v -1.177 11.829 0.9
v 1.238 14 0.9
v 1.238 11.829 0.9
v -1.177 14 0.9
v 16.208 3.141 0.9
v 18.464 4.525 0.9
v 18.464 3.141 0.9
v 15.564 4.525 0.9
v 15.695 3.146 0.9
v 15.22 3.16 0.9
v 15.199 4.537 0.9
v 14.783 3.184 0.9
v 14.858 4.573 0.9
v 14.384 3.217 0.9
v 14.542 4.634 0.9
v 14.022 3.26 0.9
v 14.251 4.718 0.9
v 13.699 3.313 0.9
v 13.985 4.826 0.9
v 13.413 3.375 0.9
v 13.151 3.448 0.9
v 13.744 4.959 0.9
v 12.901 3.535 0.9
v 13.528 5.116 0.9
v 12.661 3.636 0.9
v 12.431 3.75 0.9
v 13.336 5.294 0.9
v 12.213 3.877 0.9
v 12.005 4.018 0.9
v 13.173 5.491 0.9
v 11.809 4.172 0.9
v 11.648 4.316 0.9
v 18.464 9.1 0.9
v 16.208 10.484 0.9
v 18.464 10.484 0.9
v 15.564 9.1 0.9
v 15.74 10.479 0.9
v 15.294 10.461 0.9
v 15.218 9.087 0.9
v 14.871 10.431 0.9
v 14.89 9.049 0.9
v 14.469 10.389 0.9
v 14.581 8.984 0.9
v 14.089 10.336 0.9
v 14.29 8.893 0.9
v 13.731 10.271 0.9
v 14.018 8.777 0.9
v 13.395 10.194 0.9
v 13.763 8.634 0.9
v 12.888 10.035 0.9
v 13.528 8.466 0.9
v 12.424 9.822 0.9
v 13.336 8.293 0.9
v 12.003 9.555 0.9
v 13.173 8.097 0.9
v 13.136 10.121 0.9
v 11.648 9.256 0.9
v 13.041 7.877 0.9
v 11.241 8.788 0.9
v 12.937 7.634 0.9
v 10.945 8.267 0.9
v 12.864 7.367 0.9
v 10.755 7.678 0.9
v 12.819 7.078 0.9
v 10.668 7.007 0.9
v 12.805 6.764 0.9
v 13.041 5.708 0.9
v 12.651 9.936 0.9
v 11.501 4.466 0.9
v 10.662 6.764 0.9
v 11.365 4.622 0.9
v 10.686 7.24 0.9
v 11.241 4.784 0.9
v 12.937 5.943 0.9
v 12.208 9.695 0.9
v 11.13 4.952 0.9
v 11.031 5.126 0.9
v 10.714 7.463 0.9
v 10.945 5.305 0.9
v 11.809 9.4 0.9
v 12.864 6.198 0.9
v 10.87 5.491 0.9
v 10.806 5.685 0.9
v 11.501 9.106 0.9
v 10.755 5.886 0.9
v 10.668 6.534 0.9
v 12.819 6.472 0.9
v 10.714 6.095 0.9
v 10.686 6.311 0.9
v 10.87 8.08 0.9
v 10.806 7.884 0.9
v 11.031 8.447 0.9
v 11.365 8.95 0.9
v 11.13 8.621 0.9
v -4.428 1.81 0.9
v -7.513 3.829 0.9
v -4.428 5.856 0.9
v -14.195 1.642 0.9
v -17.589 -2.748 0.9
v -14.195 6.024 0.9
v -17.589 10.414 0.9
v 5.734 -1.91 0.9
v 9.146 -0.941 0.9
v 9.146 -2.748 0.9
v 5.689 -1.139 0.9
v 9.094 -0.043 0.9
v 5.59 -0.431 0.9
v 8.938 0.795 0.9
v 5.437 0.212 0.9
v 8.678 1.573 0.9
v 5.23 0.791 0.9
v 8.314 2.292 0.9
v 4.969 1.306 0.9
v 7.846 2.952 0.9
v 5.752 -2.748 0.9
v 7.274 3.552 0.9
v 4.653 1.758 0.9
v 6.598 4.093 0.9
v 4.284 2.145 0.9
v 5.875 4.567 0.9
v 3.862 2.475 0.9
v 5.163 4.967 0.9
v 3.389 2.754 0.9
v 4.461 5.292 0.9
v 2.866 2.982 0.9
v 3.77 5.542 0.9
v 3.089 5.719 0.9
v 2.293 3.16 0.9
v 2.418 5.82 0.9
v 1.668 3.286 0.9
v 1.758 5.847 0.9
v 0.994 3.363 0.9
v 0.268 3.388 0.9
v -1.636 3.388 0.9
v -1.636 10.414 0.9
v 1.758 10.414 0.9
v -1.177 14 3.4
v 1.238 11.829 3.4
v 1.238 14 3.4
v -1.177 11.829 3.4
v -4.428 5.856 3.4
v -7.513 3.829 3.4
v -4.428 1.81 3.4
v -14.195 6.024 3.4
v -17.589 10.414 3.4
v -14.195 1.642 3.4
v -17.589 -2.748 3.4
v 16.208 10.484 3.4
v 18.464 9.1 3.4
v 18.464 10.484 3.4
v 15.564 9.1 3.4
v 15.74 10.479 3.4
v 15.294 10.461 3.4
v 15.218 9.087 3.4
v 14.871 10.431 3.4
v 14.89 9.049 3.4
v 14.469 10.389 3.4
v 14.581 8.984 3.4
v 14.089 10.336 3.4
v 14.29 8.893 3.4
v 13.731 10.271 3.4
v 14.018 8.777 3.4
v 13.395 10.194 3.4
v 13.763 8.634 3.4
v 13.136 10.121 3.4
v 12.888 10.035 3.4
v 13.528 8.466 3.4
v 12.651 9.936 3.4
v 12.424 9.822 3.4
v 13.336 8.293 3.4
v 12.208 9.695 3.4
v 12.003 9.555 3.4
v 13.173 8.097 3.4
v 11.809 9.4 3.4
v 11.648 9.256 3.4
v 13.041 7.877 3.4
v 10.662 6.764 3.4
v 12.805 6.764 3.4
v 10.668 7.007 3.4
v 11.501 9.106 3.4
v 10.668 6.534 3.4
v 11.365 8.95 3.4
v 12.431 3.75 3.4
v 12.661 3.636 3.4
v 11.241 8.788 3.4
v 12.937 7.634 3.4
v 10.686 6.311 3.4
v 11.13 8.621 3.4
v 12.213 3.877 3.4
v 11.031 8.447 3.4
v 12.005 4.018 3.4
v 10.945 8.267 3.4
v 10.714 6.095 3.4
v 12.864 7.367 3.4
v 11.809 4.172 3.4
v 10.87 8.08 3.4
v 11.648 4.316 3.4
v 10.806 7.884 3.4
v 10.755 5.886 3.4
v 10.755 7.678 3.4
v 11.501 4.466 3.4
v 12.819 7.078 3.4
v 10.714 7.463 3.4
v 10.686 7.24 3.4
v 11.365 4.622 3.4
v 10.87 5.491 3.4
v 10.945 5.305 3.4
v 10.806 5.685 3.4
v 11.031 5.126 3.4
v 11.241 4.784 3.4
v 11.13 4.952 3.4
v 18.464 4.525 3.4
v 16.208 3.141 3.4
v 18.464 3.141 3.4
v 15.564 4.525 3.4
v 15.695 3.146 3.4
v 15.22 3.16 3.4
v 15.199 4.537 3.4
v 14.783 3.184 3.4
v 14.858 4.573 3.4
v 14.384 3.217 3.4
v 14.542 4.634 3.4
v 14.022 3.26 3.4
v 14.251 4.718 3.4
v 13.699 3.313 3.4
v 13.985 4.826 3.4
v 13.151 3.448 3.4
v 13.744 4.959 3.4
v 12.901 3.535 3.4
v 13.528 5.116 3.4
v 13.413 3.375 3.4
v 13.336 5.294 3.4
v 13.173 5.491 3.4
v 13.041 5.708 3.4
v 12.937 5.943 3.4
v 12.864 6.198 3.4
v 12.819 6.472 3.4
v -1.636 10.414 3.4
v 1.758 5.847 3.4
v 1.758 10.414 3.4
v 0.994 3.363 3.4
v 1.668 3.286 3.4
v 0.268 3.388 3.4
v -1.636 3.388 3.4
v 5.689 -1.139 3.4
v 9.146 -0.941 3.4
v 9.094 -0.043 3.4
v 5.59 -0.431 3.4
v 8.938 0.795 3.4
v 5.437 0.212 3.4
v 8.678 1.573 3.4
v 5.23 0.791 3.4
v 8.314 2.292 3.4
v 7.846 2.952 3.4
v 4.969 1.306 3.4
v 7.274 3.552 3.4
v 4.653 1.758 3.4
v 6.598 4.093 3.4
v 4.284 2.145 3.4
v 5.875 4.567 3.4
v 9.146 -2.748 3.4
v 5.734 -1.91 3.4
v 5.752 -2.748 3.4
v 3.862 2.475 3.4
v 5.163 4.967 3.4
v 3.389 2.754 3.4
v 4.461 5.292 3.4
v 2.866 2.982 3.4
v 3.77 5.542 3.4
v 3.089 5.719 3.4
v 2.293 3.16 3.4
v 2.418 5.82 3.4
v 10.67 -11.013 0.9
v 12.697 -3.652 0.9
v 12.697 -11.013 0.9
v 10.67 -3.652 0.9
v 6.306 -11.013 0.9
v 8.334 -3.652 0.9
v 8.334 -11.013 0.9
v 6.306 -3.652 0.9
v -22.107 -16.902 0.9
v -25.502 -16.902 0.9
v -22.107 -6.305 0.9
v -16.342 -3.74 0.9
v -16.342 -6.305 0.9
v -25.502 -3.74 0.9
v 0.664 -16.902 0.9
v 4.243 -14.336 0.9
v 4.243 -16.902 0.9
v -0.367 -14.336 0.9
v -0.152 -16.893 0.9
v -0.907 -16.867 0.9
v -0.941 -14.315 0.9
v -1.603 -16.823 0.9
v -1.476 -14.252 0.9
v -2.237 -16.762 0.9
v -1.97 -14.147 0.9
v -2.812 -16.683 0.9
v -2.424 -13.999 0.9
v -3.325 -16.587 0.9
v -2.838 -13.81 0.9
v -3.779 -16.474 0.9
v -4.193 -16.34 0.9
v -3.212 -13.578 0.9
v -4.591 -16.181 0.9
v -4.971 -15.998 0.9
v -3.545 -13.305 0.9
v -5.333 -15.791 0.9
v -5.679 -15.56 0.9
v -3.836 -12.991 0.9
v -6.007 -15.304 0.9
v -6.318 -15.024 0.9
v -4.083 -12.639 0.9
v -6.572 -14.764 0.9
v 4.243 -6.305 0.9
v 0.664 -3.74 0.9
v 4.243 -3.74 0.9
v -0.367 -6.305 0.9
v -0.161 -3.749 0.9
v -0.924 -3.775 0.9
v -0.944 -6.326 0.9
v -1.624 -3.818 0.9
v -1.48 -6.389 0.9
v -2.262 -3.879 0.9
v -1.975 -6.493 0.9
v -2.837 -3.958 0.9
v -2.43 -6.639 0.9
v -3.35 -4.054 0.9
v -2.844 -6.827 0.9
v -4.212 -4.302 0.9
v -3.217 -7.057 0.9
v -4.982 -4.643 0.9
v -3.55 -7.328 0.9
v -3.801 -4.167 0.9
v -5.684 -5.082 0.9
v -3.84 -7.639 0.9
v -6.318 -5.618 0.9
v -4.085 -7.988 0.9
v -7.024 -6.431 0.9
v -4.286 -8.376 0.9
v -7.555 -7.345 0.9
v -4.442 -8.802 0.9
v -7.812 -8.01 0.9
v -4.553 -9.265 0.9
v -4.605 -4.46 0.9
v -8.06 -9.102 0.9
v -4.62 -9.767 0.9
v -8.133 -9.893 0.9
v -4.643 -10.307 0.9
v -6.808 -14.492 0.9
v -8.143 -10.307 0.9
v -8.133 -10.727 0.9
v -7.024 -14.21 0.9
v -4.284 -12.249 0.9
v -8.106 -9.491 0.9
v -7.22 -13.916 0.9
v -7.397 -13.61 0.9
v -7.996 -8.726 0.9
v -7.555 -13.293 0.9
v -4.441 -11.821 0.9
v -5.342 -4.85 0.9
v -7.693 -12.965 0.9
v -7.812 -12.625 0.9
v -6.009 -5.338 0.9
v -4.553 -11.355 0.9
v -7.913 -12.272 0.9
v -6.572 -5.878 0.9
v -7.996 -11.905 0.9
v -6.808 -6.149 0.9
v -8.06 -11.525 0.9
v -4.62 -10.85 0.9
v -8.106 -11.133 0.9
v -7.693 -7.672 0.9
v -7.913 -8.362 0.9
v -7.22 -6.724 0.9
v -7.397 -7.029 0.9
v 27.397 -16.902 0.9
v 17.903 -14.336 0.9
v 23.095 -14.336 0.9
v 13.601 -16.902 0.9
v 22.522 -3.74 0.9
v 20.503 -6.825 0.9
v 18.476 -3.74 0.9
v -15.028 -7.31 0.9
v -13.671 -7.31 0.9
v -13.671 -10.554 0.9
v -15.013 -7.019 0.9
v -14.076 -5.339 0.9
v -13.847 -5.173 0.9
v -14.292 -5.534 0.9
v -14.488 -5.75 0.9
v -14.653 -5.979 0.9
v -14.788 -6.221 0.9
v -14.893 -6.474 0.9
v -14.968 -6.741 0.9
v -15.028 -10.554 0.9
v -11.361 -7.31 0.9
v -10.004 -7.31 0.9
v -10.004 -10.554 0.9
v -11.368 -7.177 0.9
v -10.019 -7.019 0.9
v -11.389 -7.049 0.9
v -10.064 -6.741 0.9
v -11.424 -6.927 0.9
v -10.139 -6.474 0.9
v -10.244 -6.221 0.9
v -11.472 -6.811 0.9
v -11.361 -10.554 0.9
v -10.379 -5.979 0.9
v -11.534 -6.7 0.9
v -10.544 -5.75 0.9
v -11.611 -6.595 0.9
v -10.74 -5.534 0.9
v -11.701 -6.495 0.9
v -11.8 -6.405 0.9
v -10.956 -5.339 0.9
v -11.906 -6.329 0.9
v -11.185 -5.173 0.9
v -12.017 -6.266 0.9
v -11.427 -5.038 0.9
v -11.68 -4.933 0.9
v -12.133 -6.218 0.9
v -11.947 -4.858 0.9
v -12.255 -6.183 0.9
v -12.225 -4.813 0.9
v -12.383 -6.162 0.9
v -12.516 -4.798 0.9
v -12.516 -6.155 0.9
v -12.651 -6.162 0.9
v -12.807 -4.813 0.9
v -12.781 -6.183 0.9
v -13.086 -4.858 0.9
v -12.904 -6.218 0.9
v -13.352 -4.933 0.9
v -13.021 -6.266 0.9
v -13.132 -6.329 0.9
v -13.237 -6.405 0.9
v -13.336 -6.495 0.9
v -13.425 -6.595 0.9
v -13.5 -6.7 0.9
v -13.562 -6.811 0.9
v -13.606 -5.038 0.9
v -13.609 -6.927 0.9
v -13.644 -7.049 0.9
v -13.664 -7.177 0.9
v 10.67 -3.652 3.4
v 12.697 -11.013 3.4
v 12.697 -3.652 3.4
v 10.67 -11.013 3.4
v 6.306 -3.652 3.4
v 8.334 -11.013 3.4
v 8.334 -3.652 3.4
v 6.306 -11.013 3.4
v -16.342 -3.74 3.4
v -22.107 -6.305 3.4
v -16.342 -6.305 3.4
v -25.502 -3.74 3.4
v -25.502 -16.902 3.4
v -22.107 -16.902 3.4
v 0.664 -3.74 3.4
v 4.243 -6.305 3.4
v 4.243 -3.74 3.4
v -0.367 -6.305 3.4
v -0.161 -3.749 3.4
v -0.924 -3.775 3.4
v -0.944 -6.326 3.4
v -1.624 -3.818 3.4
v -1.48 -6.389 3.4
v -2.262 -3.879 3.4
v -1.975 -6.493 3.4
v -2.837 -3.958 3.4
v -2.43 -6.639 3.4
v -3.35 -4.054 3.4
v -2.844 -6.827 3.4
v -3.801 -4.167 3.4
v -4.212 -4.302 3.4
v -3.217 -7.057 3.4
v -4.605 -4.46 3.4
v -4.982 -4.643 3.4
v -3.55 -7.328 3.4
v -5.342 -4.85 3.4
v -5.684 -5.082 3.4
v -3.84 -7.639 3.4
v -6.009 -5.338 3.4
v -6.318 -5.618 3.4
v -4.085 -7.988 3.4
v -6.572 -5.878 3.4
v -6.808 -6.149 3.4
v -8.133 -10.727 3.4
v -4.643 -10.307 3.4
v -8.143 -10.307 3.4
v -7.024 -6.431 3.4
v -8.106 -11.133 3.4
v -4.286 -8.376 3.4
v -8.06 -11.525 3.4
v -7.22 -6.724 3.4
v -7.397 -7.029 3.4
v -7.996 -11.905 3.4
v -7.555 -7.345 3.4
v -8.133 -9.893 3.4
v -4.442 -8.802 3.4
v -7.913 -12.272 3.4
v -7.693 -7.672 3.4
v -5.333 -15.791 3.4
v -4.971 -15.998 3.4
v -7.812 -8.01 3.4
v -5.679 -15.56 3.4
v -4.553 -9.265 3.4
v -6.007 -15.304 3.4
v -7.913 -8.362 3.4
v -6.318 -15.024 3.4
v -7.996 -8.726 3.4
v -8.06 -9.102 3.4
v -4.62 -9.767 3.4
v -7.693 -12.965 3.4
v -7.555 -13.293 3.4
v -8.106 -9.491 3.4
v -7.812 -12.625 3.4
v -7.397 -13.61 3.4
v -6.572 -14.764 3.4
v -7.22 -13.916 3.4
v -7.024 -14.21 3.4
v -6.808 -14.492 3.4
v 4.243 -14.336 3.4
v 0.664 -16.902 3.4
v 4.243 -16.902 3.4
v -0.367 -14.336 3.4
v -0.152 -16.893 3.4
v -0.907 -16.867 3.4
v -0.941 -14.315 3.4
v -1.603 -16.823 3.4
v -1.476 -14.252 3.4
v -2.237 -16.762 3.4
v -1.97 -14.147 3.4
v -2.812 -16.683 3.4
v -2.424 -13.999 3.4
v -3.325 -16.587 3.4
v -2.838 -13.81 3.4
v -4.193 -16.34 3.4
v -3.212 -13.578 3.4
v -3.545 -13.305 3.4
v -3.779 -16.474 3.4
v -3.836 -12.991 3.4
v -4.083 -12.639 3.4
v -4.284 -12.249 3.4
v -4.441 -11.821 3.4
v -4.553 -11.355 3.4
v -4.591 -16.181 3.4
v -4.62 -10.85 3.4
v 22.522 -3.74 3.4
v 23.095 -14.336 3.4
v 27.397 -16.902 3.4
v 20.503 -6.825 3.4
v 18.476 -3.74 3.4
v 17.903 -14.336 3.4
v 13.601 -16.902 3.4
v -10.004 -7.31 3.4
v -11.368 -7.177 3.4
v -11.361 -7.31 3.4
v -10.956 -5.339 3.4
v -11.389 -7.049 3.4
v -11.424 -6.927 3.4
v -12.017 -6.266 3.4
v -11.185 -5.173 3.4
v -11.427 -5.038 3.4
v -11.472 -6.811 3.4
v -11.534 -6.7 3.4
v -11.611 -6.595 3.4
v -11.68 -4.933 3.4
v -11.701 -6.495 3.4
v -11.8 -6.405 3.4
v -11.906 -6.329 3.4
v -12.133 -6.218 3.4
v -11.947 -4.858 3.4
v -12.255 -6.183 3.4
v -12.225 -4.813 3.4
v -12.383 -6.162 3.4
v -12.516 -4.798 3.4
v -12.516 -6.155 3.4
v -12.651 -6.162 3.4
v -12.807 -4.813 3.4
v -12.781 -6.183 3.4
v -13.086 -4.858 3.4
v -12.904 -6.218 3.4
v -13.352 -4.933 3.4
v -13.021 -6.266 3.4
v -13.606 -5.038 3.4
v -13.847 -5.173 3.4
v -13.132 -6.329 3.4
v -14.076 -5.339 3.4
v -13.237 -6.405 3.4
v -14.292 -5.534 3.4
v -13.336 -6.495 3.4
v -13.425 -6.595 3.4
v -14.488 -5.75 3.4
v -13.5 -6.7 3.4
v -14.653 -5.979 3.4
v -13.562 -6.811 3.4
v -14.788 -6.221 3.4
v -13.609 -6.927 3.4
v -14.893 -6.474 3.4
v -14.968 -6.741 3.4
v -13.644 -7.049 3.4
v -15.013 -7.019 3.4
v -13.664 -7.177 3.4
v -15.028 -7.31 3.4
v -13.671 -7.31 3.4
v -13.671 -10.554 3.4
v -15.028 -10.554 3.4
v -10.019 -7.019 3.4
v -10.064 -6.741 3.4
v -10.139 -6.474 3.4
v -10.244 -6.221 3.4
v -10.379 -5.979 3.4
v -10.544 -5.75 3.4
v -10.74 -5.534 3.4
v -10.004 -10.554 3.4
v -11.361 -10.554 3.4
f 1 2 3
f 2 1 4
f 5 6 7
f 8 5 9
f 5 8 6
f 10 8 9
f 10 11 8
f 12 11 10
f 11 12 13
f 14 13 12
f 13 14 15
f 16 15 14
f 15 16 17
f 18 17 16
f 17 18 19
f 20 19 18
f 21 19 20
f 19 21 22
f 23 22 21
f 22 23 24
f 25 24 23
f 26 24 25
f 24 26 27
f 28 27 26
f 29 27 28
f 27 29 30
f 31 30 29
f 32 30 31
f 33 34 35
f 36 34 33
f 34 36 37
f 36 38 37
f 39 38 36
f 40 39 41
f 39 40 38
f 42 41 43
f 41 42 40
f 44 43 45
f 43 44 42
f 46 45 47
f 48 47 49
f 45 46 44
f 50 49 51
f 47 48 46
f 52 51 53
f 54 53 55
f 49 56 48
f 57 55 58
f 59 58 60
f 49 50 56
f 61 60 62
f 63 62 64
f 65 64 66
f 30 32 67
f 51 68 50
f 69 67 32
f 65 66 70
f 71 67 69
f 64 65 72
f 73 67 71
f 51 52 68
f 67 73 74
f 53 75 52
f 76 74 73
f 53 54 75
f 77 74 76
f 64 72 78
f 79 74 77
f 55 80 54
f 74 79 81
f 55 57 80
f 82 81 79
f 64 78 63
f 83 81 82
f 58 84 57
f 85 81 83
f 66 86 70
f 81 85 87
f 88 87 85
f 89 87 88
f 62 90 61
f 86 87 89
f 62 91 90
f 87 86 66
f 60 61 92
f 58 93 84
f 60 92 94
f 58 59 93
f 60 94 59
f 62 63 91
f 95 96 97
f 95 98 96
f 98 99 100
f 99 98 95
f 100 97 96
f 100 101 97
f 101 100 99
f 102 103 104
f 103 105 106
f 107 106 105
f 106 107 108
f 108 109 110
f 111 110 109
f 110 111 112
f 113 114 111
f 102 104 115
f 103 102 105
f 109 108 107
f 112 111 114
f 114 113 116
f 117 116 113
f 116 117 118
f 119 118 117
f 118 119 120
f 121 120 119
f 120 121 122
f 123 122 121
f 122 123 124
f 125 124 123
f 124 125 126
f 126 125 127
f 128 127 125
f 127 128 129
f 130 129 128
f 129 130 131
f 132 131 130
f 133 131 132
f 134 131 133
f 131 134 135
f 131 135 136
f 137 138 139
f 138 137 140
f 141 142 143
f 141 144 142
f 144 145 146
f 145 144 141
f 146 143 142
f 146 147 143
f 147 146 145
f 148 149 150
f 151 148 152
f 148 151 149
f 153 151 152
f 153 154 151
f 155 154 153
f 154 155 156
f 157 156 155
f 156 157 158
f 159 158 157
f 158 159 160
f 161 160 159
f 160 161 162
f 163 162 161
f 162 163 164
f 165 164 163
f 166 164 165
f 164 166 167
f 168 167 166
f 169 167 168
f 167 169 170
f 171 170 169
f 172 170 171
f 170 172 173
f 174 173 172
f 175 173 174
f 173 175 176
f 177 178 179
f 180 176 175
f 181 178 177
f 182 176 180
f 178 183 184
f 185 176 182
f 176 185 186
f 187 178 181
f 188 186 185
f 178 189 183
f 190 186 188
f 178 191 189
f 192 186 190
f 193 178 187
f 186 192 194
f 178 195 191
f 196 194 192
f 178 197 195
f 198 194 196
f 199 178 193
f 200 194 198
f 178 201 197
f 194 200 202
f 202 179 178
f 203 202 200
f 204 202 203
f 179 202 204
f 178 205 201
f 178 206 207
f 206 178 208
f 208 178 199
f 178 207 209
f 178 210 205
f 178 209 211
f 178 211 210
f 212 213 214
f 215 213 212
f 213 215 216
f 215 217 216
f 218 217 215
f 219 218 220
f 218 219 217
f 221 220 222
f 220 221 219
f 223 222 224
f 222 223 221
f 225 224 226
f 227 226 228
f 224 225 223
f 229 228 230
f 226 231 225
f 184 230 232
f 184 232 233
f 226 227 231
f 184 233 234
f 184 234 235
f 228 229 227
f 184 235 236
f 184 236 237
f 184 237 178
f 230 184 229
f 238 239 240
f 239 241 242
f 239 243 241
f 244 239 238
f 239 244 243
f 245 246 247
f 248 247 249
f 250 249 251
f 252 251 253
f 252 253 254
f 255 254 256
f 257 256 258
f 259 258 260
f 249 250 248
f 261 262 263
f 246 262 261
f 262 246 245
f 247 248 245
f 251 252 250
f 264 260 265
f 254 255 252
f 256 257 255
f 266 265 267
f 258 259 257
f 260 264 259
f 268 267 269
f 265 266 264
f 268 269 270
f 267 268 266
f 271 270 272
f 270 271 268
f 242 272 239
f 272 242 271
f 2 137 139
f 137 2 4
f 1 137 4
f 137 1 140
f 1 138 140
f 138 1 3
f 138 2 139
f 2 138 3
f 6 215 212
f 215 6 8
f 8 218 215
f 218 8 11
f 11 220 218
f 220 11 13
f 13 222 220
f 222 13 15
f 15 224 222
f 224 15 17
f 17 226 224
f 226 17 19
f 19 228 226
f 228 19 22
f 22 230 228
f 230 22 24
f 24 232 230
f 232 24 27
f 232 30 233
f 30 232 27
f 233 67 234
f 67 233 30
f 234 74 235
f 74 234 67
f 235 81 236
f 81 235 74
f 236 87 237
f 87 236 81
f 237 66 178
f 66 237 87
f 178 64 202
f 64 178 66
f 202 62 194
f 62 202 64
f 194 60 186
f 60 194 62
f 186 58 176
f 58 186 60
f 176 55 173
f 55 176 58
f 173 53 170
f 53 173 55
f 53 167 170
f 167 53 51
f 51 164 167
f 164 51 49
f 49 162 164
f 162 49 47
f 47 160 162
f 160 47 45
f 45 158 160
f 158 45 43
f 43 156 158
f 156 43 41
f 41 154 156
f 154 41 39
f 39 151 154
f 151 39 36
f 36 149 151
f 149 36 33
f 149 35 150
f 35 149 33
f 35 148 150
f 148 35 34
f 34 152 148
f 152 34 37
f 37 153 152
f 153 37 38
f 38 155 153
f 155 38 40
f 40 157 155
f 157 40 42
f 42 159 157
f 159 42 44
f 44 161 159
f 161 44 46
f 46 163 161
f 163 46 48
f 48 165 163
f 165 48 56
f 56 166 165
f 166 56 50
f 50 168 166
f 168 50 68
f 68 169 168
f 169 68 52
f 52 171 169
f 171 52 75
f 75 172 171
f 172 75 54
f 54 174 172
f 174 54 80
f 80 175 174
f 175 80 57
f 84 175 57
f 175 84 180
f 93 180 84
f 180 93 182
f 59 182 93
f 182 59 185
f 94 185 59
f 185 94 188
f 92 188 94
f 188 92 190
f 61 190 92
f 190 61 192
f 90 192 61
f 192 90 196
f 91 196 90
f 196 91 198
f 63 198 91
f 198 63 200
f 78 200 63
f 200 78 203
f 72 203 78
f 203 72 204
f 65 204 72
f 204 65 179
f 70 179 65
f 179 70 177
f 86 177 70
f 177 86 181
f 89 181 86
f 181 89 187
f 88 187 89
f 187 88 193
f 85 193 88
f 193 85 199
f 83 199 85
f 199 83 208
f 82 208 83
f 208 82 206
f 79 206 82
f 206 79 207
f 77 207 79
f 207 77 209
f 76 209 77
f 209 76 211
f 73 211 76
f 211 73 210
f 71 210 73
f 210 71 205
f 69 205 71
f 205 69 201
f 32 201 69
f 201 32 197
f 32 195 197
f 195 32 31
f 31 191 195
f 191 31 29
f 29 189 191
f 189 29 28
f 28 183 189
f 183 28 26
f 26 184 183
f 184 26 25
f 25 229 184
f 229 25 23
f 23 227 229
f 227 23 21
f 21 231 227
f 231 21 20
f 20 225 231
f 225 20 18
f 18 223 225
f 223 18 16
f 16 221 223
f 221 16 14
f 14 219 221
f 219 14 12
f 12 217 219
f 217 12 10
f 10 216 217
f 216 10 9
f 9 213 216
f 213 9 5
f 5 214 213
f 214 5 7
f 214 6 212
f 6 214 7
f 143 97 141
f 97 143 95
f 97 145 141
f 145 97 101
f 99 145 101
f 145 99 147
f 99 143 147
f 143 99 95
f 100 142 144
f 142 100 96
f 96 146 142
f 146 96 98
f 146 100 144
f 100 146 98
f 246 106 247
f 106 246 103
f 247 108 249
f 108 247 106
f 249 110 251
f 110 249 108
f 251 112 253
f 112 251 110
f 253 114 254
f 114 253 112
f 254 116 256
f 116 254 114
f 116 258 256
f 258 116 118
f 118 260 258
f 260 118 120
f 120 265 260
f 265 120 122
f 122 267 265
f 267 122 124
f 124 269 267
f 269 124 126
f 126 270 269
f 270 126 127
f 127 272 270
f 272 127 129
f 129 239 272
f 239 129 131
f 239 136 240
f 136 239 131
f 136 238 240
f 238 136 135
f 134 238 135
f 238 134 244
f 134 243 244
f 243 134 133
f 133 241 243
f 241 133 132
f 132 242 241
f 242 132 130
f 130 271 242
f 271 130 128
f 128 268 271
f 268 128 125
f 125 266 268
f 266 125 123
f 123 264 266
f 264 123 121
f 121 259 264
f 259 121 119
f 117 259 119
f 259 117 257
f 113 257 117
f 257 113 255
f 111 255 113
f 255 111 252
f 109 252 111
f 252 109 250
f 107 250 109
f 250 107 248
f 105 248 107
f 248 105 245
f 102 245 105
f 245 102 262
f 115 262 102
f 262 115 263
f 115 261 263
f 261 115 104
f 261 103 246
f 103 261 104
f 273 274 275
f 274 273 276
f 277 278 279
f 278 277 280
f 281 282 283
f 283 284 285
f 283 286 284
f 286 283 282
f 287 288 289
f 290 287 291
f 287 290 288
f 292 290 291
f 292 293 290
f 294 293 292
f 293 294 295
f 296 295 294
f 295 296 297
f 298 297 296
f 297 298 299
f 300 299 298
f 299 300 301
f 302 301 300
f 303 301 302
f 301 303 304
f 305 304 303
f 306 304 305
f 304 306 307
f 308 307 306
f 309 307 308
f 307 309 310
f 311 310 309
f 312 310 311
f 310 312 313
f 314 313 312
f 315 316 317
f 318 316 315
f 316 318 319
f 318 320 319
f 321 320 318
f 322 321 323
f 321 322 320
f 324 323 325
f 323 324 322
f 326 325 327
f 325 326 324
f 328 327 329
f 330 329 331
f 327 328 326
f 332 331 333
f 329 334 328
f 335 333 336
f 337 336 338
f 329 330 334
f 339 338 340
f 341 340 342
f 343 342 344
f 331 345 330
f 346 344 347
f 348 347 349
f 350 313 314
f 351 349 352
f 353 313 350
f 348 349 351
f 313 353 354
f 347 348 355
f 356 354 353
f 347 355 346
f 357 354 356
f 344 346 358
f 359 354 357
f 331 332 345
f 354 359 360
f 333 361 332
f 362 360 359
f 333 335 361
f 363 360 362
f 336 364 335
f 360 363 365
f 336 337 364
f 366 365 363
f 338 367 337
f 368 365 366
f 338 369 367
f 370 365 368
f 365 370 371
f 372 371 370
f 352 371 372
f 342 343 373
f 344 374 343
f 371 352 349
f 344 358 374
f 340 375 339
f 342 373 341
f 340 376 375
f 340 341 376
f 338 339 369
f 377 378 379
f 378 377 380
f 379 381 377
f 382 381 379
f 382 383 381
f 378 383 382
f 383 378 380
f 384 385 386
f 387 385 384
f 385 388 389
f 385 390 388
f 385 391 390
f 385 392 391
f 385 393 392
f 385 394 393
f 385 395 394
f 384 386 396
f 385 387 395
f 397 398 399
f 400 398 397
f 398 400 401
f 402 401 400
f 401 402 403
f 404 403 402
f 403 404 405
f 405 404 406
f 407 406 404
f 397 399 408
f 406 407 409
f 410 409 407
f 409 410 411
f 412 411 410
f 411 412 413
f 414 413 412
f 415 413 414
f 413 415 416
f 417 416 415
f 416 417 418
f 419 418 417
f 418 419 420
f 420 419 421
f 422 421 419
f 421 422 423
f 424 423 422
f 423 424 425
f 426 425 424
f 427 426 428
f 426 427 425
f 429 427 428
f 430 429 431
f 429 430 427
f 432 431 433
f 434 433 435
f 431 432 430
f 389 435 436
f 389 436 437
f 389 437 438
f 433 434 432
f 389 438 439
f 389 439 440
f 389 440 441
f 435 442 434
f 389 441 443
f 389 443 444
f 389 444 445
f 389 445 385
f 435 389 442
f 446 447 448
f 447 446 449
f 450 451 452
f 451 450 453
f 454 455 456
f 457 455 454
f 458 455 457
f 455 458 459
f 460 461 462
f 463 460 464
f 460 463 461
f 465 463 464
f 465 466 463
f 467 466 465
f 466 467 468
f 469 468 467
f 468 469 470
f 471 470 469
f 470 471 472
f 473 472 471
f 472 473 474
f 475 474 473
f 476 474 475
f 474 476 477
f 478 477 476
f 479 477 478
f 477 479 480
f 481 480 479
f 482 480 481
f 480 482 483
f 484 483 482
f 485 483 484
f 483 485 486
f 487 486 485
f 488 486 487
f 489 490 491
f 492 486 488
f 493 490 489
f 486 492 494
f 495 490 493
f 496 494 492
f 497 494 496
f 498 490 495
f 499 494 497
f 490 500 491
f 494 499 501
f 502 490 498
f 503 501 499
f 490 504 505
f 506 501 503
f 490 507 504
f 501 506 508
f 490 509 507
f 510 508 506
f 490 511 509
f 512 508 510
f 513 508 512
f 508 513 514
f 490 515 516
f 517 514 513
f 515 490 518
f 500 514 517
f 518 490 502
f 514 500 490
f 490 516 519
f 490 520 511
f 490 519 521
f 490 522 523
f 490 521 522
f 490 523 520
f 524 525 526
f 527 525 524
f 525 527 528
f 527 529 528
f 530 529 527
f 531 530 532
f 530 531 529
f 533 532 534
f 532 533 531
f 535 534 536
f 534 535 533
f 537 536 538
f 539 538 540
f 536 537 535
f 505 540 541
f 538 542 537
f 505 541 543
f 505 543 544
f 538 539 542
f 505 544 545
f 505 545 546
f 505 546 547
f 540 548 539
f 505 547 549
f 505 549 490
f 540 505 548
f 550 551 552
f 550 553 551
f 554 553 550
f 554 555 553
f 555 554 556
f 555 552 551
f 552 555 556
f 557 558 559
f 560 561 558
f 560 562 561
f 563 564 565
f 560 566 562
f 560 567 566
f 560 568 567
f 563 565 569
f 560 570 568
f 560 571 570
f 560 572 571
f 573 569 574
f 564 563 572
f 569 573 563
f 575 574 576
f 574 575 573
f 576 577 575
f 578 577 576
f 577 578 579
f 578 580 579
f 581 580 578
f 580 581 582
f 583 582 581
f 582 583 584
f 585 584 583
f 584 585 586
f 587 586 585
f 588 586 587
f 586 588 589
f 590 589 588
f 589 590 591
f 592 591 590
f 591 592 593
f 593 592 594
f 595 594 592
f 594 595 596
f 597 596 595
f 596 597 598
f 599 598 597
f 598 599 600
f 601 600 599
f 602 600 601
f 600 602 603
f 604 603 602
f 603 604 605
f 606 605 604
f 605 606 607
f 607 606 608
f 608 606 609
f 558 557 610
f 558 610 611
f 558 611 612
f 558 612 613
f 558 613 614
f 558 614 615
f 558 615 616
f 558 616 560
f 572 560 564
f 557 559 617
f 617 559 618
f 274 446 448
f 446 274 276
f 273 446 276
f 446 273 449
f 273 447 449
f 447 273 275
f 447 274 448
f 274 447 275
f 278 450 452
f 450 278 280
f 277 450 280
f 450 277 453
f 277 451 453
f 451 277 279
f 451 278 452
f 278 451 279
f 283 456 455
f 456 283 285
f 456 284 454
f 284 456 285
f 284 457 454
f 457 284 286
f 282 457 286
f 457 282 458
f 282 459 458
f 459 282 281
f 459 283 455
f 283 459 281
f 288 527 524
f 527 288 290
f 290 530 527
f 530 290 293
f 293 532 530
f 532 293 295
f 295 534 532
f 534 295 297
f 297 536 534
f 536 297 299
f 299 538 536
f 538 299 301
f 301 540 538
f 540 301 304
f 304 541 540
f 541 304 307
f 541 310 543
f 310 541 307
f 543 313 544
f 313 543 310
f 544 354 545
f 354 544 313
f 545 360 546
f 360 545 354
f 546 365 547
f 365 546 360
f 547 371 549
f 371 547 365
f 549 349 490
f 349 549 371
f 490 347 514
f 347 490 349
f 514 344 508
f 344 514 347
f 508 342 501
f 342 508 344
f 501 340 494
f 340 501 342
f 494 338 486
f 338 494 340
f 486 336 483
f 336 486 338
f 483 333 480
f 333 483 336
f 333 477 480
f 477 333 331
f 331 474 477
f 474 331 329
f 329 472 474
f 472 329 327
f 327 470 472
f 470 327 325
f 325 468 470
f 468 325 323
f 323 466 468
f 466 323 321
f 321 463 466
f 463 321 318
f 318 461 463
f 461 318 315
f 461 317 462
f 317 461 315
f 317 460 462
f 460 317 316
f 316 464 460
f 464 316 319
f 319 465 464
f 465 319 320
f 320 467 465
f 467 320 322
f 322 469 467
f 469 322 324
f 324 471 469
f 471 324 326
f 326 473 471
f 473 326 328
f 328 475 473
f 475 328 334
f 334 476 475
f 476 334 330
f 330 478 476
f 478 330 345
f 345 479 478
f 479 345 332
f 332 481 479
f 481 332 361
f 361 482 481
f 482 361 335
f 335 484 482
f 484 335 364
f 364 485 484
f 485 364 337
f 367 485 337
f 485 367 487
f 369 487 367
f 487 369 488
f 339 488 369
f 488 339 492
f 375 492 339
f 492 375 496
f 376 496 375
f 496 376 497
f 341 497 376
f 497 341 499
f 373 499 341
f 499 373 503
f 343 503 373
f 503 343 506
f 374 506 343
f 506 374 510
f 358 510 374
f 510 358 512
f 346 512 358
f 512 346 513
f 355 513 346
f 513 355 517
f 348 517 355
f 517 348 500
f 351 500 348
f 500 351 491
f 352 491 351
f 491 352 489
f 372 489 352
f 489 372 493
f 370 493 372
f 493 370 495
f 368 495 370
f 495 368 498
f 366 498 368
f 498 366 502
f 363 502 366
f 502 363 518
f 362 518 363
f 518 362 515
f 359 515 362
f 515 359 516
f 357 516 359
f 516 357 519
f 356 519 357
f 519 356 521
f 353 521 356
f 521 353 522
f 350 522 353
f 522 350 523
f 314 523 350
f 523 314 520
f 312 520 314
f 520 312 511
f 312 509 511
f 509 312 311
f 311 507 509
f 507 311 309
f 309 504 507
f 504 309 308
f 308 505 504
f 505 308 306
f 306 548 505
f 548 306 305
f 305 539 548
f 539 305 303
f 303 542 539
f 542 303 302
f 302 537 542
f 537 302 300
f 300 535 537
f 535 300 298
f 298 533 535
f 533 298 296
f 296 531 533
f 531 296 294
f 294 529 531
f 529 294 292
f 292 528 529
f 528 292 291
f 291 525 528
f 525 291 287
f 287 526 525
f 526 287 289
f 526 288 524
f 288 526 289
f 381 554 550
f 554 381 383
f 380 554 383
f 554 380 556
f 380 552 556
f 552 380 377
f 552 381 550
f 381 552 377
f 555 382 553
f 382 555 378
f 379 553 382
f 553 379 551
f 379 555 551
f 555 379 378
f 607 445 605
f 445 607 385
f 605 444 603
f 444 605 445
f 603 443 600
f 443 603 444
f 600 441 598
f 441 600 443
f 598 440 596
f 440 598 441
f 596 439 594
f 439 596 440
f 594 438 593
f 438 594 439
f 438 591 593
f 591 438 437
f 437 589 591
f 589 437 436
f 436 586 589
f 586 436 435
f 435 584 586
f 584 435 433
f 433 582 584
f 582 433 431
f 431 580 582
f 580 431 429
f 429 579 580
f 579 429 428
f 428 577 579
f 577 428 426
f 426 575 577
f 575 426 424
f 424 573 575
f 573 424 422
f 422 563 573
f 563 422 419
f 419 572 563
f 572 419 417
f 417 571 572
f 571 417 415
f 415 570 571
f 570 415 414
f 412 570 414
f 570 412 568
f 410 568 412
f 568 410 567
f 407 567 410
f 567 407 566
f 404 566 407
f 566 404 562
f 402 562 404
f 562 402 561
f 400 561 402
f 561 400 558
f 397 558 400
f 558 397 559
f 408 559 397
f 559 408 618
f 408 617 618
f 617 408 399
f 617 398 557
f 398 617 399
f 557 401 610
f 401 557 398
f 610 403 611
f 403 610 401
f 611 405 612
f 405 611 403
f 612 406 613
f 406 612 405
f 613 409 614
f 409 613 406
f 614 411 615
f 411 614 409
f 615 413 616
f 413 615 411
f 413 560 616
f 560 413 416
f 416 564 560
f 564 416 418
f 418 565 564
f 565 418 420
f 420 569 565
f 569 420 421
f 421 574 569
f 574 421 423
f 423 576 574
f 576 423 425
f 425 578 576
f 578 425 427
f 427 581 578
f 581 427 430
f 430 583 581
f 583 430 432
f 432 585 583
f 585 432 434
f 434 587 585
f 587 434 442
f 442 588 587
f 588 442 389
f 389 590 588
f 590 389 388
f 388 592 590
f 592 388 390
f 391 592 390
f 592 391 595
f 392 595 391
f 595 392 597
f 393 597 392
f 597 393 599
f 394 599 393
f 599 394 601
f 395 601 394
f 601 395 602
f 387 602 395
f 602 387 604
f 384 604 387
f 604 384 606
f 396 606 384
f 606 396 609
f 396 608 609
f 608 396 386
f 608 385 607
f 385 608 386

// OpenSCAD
$fn = 48;
  // syllabics (overlaid on icon, tallest)
  translate([0, 5.430, 0.900]) linear_extrude(height=2.500) text("ᐅᓵᒼ", size=13.000, halign="center", valign="center", font="Euphemia UCAS:style=Bold");
  translate([0, -10.430, 0.900]) linear_extrude(height=2.500) text("ᒥᐢᑕᐦᐃ", size=13.000, halign="center", valign="center", font="Euphemia UCAS:style=Bold");
